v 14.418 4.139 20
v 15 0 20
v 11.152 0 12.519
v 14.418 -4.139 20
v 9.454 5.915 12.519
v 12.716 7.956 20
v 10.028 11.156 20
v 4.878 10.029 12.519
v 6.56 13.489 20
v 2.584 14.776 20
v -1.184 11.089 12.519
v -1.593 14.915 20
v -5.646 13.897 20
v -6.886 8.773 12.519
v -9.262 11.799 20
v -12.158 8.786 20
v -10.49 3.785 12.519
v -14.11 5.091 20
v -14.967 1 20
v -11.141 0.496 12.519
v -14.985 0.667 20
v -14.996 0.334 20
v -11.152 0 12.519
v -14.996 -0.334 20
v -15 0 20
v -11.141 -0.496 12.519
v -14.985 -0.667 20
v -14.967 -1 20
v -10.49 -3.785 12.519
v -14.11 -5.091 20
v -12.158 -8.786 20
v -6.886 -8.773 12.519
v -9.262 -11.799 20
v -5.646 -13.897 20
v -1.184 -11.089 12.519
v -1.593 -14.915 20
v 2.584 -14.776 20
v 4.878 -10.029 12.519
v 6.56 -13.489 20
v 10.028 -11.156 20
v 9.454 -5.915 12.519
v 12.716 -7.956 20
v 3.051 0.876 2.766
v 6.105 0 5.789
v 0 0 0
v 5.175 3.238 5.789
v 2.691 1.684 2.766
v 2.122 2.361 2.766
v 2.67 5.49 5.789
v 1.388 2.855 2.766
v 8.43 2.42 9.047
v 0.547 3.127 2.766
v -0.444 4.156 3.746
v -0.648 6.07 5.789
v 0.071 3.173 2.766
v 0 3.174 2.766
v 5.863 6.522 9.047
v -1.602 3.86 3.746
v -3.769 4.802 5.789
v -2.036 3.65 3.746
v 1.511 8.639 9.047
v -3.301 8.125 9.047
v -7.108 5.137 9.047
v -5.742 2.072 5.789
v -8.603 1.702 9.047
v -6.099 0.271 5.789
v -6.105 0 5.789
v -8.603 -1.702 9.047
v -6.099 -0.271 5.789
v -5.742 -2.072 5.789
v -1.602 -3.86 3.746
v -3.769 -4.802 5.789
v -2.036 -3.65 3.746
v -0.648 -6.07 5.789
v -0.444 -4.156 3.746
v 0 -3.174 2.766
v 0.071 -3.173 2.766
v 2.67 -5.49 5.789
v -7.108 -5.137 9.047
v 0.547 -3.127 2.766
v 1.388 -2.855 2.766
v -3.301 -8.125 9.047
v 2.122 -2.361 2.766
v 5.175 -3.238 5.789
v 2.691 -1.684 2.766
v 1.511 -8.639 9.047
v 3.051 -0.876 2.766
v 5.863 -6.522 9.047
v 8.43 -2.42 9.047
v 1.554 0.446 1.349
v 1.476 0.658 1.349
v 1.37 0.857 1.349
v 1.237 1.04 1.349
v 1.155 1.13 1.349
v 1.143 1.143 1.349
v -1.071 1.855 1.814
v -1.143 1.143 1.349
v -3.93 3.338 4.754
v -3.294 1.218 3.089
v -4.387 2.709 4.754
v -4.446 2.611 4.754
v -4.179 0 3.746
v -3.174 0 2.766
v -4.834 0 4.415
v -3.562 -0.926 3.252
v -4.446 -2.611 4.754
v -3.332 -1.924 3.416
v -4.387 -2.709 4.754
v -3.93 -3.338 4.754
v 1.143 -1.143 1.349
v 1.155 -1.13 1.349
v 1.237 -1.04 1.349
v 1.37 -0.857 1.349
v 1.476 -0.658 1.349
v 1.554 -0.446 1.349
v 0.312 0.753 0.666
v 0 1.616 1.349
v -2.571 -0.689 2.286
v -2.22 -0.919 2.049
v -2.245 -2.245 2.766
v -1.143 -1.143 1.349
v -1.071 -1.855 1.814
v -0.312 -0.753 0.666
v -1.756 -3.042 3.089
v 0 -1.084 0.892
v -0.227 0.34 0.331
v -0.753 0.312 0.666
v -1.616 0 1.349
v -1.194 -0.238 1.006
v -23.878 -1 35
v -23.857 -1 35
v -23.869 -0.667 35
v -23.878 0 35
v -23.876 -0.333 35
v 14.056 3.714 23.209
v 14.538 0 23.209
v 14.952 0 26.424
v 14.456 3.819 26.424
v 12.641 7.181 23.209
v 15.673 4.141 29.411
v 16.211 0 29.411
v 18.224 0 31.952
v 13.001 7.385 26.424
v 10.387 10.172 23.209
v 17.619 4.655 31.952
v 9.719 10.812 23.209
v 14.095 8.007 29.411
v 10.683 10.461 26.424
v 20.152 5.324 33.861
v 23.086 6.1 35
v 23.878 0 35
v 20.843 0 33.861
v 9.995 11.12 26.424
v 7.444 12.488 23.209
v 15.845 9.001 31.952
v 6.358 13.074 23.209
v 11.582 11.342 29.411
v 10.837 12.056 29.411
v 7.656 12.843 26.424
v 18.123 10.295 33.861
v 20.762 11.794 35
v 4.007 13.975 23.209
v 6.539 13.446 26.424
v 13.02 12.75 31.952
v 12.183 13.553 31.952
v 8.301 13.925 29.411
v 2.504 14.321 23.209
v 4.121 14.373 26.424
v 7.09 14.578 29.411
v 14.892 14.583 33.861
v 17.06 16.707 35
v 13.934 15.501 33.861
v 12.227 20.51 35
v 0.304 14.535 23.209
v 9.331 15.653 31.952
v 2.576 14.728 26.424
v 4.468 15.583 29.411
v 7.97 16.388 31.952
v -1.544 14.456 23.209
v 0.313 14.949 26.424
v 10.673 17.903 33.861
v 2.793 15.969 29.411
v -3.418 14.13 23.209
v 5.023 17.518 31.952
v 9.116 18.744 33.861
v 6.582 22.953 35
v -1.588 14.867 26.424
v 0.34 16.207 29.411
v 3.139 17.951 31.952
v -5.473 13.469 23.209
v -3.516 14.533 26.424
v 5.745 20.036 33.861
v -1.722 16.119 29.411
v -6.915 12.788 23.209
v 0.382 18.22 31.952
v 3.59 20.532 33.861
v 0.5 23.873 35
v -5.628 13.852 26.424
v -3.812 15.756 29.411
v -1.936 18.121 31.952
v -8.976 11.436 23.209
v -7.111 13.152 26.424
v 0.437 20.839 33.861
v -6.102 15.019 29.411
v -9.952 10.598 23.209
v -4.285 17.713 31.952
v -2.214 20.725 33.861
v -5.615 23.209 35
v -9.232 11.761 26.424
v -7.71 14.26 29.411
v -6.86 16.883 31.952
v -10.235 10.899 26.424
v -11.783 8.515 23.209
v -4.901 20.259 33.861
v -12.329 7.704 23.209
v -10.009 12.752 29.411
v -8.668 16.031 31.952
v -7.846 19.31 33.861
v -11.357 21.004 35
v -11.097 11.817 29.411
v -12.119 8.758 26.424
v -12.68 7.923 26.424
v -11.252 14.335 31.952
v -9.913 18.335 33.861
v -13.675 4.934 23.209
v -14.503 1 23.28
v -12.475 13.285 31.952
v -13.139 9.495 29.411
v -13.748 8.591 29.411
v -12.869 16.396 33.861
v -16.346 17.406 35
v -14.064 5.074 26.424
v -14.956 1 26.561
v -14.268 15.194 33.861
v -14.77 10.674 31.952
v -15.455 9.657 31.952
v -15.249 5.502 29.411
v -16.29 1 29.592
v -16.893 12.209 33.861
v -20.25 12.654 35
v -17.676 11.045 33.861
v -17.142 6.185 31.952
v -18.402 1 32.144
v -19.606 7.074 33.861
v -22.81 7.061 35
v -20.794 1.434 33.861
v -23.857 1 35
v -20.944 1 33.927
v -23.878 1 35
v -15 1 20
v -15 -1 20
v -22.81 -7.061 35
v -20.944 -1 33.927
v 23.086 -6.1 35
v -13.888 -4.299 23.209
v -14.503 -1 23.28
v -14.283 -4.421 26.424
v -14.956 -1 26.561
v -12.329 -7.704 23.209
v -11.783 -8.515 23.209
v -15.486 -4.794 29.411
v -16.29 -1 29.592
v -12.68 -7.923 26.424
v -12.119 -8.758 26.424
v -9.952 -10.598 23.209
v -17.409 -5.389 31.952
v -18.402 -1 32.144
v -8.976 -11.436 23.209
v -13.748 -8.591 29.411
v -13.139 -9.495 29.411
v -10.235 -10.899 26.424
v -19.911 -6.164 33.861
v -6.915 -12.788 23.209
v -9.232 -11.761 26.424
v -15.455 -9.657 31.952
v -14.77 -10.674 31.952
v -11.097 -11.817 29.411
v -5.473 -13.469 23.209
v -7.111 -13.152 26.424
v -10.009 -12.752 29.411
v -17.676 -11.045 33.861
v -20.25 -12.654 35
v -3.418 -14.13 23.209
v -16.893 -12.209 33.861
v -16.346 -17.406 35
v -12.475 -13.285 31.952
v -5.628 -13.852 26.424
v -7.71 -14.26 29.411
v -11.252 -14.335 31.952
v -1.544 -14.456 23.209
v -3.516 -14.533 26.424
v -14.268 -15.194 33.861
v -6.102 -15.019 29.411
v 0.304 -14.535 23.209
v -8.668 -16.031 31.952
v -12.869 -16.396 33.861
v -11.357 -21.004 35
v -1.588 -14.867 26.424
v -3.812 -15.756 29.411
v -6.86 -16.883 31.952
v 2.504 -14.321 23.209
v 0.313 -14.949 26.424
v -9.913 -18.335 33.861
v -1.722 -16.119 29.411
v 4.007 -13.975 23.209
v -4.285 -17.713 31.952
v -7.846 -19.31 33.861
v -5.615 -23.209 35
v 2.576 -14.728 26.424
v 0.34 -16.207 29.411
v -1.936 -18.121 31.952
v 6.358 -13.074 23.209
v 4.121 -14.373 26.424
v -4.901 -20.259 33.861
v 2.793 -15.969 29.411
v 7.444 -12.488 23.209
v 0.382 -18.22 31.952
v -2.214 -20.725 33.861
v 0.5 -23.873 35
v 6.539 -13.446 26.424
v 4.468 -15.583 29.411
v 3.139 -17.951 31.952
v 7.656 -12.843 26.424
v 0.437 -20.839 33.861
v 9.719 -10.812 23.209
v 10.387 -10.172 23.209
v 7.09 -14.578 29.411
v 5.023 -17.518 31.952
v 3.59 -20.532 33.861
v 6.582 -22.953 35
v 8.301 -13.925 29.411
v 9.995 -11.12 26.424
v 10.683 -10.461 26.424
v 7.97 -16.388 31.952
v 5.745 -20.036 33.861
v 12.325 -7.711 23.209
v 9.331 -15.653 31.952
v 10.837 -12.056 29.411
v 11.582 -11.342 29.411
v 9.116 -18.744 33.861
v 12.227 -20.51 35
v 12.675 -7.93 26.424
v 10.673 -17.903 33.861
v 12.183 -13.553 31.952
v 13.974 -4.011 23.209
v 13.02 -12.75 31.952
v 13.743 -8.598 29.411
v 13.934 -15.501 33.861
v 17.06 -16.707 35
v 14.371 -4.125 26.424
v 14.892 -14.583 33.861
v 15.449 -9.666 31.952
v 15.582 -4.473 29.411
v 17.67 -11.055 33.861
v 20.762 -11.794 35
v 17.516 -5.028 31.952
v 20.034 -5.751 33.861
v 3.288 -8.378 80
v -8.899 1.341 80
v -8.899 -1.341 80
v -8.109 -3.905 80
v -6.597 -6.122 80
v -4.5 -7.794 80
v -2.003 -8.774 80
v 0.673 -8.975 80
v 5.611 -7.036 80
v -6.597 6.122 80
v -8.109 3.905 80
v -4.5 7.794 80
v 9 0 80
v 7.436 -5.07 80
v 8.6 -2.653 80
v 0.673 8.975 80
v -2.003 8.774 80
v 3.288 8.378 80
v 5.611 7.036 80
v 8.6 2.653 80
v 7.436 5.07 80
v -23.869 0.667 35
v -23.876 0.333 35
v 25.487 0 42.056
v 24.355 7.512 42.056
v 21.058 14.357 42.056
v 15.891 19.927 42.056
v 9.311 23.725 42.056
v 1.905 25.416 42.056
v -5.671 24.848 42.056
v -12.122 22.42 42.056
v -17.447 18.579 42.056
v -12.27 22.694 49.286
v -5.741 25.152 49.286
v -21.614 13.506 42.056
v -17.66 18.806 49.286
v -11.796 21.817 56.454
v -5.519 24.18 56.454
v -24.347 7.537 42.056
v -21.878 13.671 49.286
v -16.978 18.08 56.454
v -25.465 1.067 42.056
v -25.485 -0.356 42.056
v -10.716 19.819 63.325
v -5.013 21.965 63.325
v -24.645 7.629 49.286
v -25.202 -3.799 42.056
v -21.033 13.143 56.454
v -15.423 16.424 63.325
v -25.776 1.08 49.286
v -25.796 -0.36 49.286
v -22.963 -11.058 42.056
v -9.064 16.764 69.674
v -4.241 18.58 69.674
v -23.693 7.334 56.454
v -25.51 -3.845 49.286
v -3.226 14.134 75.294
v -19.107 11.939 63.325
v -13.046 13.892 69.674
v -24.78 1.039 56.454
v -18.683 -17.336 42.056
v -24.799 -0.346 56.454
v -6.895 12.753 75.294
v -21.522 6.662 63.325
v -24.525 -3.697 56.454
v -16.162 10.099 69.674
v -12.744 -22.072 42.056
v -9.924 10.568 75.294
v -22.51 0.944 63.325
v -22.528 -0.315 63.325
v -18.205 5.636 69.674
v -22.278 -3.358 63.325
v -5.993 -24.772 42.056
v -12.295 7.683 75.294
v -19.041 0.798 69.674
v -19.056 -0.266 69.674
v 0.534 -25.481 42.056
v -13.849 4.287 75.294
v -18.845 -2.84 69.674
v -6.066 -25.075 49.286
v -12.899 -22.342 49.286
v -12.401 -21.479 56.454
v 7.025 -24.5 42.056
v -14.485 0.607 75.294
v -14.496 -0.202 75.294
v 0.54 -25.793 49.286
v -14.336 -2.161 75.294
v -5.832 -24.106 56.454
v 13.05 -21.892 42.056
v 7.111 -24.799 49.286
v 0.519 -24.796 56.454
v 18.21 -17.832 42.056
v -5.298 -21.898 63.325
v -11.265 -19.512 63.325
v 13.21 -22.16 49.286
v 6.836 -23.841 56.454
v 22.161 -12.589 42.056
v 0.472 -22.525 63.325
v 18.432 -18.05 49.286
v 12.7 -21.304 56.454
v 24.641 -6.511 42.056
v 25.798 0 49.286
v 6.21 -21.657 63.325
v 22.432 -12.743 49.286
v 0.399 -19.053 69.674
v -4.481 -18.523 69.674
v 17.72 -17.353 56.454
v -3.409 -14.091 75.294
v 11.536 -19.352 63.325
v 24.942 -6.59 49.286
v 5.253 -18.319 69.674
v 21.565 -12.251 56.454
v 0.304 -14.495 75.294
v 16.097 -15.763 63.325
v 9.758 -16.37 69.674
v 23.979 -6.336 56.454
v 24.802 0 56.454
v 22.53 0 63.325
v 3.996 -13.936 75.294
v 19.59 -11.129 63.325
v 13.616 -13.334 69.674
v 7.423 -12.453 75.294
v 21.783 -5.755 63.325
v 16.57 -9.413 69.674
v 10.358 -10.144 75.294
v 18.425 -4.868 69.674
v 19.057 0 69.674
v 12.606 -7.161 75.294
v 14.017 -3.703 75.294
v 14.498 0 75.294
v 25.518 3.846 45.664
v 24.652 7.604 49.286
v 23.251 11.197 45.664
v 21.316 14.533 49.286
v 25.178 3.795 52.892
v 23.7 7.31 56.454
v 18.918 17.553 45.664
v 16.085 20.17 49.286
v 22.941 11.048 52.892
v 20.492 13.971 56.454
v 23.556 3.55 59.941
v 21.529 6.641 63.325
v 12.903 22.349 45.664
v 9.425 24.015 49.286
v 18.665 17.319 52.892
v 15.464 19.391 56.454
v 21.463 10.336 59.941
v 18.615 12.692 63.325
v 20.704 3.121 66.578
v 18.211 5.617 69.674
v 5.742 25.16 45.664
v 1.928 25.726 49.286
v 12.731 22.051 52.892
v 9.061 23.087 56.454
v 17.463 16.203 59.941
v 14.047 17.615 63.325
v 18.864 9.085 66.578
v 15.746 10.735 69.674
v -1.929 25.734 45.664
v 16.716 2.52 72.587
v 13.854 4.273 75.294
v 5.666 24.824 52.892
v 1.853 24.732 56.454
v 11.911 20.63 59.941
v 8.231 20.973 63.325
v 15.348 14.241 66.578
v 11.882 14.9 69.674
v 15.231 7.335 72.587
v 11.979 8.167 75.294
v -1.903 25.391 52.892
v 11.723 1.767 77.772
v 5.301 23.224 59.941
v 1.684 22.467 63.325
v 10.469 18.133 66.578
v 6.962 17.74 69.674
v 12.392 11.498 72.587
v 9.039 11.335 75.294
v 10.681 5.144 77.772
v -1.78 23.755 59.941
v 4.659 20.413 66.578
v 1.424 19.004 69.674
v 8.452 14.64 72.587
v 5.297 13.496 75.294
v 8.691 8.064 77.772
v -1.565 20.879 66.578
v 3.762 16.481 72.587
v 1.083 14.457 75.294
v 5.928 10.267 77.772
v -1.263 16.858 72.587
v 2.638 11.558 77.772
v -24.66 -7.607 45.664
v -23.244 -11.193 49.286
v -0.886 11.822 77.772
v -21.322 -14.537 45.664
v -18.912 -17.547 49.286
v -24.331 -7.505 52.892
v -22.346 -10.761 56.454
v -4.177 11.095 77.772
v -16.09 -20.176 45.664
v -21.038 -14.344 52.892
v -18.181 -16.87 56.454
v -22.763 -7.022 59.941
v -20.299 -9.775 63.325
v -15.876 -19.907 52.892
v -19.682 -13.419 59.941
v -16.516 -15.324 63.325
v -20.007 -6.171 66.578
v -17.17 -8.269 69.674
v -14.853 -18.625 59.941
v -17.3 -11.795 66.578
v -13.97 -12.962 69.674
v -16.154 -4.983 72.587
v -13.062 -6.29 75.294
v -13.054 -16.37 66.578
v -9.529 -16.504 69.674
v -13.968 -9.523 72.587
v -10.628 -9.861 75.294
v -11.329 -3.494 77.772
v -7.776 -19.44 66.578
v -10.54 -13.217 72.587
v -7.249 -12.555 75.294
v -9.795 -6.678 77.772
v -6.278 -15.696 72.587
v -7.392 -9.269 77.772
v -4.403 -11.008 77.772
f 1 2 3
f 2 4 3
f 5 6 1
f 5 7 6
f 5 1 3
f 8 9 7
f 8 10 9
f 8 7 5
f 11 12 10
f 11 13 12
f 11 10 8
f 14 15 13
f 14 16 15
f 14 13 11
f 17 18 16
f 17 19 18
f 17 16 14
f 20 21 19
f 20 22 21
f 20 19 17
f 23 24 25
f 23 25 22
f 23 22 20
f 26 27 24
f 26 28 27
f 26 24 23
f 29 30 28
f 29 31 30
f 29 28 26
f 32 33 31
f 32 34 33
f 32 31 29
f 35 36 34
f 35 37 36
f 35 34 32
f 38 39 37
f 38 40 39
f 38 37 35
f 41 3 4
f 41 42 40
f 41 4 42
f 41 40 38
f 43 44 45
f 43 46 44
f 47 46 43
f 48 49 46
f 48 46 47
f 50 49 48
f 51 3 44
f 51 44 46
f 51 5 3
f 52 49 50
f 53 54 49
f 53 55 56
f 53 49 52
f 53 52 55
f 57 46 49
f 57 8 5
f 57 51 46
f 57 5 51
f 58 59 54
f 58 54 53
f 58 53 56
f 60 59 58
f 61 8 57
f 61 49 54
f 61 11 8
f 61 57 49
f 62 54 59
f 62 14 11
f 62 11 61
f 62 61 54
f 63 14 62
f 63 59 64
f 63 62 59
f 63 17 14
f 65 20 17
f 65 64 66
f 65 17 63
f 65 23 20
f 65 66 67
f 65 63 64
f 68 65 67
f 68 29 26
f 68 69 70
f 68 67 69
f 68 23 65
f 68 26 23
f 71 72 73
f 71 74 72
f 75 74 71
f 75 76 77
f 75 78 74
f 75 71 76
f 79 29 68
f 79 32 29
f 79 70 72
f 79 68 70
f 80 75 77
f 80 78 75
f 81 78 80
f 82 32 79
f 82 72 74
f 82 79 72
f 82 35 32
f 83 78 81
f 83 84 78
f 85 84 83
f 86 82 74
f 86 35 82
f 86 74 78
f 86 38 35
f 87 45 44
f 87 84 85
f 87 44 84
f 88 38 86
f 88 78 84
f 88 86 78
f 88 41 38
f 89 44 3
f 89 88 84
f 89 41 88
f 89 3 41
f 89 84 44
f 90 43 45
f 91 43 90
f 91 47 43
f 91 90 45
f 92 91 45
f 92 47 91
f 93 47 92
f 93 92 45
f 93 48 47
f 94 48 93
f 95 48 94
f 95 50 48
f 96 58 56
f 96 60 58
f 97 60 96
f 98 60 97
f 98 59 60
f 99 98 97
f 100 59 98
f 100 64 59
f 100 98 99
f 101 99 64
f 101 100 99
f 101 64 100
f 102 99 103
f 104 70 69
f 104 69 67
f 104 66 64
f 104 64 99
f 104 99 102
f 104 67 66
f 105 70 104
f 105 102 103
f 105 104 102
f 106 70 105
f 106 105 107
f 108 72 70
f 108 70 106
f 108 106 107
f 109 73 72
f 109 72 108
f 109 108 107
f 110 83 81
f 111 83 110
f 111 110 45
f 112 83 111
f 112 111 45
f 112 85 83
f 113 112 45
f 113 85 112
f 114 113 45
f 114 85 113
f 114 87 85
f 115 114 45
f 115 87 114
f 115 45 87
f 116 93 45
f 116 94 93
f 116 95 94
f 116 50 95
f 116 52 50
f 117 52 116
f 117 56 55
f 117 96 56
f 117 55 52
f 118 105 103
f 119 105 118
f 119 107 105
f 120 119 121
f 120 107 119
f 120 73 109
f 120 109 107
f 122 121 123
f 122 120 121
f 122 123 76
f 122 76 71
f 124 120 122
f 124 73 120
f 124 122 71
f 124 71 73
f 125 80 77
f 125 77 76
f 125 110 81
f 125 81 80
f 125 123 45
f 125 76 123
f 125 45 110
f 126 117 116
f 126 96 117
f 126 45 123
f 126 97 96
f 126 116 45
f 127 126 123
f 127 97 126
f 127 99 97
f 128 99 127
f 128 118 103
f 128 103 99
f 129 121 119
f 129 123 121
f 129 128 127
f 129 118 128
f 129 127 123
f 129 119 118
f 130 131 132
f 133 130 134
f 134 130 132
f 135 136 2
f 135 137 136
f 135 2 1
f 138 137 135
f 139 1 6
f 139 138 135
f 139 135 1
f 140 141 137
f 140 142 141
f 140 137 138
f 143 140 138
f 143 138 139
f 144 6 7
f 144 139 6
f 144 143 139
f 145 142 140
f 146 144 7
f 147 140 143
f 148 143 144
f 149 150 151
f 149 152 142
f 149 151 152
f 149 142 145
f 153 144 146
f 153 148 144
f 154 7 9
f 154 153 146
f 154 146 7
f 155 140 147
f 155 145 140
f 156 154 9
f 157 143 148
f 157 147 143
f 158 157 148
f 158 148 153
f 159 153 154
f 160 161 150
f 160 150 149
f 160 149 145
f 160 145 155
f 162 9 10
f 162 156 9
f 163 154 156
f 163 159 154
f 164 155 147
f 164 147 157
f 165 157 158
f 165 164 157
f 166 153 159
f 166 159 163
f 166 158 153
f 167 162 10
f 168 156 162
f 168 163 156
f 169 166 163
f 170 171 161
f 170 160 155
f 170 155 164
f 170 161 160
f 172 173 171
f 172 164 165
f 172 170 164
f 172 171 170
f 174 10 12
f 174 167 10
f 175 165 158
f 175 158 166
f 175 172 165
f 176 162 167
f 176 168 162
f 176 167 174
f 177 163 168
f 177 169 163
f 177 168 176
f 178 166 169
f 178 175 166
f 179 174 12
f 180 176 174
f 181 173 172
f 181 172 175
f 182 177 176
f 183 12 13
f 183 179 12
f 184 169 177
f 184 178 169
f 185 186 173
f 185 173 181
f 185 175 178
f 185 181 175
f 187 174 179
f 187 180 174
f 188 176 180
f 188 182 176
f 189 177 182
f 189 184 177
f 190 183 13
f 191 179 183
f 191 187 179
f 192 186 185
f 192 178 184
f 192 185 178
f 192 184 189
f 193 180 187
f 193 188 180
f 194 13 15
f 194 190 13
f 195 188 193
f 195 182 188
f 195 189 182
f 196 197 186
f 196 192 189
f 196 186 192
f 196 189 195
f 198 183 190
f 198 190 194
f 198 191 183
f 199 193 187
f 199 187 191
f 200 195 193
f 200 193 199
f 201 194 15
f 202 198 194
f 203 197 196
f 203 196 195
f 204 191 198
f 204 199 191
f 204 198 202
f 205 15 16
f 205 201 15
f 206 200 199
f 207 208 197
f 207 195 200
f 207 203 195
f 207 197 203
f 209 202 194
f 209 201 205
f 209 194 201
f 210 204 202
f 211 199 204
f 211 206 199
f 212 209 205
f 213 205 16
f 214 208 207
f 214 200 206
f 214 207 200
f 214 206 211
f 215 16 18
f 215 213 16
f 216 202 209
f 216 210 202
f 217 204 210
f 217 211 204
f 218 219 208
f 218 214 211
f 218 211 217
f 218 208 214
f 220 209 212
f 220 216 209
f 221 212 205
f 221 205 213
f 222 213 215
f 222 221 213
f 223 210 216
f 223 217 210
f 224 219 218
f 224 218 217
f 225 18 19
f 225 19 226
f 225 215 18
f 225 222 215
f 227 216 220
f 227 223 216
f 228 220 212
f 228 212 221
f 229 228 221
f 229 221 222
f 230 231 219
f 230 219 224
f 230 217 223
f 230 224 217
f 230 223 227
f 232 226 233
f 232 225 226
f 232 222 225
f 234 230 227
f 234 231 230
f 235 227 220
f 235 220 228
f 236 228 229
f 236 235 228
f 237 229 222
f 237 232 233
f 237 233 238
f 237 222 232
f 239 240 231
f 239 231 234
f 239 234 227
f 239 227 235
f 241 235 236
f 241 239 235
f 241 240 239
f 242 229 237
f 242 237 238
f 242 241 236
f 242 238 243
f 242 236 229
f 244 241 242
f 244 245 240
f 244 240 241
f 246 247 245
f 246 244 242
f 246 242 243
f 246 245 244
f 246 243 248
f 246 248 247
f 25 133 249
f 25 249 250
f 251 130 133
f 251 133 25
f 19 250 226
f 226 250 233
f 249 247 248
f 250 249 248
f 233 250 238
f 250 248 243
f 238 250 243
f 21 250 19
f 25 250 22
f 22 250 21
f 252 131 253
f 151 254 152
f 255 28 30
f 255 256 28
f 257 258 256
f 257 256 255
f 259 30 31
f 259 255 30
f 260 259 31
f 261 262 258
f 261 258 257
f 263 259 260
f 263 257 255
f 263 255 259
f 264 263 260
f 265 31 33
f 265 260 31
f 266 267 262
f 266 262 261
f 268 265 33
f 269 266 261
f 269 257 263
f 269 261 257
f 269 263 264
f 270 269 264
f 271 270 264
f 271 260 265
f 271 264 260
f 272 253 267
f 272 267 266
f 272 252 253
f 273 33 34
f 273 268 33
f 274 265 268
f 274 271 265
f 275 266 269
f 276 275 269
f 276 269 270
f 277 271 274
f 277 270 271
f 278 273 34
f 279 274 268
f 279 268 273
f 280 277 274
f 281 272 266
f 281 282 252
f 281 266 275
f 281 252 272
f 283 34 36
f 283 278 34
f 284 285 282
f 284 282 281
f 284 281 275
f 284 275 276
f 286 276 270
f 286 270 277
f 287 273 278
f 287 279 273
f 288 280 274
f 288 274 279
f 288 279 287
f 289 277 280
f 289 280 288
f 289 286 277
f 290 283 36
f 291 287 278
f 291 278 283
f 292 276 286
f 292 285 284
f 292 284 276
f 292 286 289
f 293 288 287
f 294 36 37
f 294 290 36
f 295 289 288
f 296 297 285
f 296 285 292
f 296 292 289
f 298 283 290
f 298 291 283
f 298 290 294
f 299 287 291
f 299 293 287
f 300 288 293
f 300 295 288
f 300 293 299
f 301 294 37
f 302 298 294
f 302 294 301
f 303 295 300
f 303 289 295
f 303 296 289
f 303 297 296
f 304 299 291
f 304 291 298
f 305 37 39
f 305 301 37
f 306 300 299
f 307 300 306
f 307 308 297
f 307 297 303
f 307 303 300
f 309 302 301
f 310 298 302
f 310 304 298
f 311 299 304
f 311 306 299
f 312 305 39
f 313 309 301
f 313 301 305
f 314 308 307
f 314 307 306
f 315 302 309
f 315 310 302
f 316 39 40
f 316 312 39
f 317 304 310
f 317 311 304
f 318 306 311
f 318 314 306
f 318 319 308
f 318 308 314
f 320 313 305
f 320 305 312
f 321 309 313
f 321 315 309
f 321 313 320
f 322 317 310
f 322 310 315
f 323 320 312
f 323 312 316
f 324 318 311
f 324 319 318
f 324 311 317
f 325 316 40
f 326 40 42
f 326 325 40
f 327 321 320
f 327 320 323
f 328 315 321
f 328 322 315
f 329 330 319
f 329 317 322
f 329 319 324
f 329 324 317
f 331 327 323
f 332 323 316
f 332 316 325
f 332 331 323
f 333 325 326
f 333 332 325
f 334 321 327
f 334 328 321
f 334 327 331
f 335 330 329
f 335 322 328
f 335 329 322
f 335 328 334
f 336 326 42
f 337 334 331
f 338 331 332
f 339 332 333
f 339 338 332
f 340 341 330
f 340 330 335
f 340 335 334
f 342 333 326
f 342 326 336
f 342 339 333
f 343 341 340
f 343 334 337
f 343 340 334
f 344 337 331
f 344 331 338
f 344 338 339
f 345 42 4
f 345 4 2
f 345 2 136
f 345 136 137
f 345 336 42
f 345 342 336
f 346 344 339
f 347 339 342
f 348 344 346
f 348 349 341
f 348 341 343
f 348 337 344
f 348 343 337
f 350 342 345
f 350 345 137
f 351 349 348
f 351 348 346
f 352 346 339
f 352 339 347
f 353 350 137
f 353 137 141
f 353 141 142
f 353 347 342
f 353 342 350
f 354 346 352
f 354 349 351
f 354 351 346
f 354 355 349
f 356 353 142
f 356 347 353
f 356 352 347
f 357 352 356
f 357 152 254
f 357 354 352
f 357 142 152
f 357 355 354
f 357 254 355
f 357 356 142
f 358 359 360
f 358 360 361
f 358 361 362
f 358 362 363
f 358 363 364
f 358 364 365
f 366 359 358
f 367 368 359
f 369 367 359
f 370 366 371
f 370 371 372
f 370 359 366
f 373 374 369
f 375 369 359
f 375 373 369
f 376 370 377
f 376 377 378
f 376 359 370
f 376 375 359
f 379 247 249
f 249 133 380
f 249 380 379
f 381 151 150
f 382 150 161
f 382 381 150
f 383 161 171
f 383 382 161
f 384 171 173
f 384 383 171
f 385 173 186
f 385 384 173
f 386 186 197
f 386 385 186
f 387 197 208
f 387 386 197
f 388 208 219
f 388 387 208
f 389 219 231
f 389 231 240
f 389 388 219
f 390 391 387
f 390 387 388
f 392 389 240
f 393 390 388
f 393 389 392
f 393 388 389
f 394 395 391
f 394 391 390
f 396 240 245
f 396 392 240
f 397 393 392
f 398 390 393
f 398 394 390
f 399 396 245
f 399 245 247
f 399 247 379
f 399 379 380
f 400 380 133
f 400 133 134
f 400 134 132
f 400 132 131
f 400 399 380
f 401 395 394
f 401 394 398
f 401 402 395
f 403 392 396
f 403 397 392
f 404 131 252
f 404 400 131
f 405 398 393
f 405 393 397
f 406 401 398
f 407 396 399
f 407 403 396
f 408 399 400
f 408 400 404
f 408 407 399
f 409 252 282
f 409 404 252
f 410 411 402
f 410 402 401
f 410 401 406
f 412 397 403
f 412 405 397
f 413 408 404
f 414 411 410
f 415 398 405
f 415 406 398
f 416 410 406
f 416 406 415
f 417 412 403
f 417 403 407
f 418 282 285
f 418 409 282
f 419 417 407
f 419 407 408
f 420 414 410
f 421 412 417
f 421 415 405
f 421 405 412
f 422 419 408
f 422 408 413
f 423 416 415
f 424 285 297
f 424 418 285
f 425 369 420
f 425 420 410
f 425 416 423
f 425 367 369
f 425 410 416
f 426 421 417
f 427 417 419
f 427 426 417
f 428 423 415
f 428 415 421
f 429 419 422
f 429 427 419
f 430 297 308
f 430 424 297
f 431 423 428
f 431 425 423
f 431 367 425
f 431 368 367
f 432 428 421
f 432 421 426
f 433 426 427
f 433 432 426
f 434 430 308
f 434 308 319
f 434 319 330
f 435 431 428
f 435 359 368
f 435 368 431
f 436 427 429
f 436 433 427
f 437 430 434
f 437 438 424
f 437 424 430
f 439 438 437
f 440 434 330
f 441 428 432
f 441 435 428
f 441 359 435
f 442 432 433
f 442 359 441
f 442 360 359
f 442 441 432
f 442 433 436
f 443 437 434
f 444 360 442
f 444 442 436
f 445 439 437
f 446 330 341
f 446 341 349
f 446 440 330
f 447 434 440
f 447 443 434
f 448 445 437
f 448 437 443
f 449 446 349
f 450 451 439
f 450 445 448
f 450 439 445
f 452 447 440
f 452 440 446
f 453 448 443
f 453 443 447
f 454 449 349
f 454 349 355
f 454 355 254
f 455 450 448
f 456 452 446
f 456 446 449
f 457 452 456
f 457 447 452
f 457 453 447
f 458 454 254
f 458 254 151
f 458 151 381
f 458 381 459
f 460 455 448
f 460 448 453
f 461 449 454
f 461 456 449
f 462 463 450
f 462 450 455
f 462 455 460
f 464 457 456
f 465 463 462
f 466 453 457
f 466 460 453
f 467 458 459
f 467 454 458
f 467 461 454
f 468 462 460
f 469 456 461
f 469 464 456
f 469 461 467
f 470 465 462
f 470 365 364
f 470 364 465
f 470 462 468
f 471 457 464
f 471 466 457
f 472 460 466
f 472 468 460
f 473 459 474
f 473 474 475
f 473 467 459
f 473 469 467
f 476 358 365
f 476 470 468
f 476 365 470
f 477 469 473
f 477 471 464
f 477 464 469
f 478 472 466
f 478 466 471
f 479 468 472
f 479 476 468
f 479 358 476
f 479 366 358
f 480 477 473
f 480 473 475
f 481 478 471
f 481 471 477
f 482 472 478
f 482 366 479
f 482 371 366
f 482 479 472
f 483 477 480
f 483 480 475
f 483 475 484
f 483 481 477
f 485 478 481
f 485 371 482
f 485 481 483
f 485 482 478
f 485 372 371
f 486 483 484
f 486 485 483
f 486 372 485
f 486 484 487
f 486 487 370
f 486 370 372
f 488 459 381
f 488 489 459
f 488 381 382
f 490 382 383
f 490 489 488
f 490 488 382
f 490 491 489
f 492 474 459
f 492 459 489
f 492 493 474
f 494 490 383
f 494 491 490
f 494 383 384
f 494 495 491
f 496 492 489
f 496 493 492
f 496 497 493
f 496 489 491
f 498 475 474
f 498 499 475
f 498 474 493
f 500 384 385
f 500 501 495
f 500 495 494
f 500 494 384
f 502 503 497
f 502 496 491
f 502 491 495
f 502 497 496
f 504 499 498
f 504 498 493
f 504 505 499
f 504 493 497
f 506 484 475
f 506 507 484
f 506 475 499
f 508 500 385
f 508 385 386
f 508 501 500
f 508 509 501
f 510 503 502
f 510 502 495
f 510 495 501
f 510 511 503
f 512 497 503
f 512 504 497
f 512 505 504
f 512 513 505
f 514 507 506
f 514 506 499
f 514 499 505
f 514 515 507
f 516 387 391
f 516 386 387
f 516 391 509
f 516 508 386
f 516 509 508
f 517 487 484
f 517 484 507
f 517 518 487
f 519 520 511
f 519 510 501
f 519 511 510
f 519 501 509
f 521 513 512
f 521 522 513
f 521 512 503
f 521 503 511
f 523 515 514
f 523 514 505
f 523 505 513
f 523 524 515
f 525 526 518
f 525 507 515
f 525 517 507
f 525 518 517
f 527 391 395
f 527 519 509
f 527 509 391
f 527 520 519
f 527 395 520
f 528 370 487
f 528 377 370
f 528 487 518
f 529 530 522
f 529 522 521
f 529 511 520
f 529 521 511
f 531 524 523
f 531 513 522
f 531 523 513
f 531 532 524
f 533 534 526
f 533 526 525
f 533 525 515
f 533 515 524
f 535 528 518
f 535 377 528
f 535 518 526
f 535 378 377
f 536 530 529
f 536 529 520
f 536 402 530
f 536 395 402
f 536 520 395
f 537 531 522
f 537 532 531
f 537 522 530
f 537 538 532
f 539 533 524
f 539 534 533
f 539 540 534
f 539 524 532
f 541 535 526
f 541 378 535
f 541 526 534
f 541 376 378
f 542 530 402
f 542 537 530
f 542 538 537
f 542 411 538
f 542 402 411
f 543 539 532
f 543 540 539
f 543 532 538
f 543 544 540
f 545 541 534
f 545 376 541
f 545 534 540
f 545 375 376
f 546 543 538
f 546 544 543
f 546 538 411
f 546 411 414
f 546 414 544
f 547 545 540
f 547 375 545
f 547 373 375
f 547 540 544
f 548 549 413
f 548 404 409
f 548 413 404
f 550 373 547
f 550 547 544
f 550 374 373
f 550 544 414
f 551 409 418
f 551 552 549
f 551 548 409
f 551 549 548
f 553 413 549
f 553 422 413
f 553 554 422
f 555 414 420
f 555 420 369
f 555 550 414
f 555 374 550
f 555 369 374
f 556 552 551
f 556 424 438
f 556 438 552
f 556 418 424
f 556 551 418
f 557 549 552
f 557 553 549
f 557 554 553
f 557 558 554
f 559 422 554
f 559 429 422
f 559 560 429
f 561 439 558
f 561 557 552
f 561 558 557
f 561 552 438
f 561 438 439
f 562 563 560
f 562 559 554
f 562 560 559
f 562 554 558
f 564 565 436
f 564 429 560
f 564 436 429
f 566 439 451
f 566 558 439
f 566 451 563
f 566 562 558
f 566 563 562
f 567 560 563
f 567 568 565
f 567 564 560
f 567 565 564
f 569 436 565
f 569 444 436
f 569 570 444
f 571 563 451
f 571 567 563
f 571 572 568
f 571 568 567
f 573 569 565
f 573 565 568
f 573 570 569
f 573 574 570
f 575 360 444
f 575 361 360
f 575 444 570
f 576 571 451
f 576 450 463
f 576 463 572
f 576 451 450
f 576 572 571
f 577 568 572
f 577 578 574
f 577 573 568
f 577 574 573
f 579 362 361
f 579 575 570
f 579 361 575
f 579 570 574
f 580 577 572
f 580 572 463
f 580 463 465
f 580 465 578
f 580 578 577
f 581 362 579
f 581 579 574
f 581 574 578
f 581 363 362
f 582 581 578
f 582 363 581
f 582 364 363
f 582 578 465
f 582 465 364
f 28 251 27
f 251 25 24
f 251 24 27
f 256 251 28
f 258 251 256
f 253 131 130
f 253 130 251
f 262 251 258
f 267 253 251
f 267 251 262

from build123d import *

# Parameters (mm, degrees)
F3_DEPTH = 1


with BuildPart() as f1:
    # F0 (on Front) → F1 (revolve)
    with BuildSketch(Plane.XZ):
        with BuildLine():
            Line((0, 80), (0, 35))
            Line((0, 35), (23.878137, 35))
            ThreePointArc((23.878137, 35), (23.821651, 59.940868), (9, 80))
            Line((9, 80), (0, 80))
        make_face()
        with BuildLine():
            Line((0, 35), (0, 20))
            Line((0, 20), (15, 20))
            ThreePointArc((15, 20), (16.211031, 29.410597), (23.878137, 35))
            Line((23.878137, 35), (0, 35))
        make_face()
        with BuildLine():
            Line((0, 20), (0, 0))
            ThreePointArc((0, 0), (8.770167, 9.047375), (15, 20))
            Line((15, 20), (0, 20))
        make_face()
    revolve(axis=Axis((0, 0, 40), (0, 0, 1)))

    # F2 (on Front) → F3 (join, symmetric)
    with BuildSketch(Plane.XZ):
        Polygon((0, 20), (0, 35), (-23.878137, 35), (-15, 20), align=None)
    extrude(amount=F3_DEPTH, both=True)


solid = f1.part
